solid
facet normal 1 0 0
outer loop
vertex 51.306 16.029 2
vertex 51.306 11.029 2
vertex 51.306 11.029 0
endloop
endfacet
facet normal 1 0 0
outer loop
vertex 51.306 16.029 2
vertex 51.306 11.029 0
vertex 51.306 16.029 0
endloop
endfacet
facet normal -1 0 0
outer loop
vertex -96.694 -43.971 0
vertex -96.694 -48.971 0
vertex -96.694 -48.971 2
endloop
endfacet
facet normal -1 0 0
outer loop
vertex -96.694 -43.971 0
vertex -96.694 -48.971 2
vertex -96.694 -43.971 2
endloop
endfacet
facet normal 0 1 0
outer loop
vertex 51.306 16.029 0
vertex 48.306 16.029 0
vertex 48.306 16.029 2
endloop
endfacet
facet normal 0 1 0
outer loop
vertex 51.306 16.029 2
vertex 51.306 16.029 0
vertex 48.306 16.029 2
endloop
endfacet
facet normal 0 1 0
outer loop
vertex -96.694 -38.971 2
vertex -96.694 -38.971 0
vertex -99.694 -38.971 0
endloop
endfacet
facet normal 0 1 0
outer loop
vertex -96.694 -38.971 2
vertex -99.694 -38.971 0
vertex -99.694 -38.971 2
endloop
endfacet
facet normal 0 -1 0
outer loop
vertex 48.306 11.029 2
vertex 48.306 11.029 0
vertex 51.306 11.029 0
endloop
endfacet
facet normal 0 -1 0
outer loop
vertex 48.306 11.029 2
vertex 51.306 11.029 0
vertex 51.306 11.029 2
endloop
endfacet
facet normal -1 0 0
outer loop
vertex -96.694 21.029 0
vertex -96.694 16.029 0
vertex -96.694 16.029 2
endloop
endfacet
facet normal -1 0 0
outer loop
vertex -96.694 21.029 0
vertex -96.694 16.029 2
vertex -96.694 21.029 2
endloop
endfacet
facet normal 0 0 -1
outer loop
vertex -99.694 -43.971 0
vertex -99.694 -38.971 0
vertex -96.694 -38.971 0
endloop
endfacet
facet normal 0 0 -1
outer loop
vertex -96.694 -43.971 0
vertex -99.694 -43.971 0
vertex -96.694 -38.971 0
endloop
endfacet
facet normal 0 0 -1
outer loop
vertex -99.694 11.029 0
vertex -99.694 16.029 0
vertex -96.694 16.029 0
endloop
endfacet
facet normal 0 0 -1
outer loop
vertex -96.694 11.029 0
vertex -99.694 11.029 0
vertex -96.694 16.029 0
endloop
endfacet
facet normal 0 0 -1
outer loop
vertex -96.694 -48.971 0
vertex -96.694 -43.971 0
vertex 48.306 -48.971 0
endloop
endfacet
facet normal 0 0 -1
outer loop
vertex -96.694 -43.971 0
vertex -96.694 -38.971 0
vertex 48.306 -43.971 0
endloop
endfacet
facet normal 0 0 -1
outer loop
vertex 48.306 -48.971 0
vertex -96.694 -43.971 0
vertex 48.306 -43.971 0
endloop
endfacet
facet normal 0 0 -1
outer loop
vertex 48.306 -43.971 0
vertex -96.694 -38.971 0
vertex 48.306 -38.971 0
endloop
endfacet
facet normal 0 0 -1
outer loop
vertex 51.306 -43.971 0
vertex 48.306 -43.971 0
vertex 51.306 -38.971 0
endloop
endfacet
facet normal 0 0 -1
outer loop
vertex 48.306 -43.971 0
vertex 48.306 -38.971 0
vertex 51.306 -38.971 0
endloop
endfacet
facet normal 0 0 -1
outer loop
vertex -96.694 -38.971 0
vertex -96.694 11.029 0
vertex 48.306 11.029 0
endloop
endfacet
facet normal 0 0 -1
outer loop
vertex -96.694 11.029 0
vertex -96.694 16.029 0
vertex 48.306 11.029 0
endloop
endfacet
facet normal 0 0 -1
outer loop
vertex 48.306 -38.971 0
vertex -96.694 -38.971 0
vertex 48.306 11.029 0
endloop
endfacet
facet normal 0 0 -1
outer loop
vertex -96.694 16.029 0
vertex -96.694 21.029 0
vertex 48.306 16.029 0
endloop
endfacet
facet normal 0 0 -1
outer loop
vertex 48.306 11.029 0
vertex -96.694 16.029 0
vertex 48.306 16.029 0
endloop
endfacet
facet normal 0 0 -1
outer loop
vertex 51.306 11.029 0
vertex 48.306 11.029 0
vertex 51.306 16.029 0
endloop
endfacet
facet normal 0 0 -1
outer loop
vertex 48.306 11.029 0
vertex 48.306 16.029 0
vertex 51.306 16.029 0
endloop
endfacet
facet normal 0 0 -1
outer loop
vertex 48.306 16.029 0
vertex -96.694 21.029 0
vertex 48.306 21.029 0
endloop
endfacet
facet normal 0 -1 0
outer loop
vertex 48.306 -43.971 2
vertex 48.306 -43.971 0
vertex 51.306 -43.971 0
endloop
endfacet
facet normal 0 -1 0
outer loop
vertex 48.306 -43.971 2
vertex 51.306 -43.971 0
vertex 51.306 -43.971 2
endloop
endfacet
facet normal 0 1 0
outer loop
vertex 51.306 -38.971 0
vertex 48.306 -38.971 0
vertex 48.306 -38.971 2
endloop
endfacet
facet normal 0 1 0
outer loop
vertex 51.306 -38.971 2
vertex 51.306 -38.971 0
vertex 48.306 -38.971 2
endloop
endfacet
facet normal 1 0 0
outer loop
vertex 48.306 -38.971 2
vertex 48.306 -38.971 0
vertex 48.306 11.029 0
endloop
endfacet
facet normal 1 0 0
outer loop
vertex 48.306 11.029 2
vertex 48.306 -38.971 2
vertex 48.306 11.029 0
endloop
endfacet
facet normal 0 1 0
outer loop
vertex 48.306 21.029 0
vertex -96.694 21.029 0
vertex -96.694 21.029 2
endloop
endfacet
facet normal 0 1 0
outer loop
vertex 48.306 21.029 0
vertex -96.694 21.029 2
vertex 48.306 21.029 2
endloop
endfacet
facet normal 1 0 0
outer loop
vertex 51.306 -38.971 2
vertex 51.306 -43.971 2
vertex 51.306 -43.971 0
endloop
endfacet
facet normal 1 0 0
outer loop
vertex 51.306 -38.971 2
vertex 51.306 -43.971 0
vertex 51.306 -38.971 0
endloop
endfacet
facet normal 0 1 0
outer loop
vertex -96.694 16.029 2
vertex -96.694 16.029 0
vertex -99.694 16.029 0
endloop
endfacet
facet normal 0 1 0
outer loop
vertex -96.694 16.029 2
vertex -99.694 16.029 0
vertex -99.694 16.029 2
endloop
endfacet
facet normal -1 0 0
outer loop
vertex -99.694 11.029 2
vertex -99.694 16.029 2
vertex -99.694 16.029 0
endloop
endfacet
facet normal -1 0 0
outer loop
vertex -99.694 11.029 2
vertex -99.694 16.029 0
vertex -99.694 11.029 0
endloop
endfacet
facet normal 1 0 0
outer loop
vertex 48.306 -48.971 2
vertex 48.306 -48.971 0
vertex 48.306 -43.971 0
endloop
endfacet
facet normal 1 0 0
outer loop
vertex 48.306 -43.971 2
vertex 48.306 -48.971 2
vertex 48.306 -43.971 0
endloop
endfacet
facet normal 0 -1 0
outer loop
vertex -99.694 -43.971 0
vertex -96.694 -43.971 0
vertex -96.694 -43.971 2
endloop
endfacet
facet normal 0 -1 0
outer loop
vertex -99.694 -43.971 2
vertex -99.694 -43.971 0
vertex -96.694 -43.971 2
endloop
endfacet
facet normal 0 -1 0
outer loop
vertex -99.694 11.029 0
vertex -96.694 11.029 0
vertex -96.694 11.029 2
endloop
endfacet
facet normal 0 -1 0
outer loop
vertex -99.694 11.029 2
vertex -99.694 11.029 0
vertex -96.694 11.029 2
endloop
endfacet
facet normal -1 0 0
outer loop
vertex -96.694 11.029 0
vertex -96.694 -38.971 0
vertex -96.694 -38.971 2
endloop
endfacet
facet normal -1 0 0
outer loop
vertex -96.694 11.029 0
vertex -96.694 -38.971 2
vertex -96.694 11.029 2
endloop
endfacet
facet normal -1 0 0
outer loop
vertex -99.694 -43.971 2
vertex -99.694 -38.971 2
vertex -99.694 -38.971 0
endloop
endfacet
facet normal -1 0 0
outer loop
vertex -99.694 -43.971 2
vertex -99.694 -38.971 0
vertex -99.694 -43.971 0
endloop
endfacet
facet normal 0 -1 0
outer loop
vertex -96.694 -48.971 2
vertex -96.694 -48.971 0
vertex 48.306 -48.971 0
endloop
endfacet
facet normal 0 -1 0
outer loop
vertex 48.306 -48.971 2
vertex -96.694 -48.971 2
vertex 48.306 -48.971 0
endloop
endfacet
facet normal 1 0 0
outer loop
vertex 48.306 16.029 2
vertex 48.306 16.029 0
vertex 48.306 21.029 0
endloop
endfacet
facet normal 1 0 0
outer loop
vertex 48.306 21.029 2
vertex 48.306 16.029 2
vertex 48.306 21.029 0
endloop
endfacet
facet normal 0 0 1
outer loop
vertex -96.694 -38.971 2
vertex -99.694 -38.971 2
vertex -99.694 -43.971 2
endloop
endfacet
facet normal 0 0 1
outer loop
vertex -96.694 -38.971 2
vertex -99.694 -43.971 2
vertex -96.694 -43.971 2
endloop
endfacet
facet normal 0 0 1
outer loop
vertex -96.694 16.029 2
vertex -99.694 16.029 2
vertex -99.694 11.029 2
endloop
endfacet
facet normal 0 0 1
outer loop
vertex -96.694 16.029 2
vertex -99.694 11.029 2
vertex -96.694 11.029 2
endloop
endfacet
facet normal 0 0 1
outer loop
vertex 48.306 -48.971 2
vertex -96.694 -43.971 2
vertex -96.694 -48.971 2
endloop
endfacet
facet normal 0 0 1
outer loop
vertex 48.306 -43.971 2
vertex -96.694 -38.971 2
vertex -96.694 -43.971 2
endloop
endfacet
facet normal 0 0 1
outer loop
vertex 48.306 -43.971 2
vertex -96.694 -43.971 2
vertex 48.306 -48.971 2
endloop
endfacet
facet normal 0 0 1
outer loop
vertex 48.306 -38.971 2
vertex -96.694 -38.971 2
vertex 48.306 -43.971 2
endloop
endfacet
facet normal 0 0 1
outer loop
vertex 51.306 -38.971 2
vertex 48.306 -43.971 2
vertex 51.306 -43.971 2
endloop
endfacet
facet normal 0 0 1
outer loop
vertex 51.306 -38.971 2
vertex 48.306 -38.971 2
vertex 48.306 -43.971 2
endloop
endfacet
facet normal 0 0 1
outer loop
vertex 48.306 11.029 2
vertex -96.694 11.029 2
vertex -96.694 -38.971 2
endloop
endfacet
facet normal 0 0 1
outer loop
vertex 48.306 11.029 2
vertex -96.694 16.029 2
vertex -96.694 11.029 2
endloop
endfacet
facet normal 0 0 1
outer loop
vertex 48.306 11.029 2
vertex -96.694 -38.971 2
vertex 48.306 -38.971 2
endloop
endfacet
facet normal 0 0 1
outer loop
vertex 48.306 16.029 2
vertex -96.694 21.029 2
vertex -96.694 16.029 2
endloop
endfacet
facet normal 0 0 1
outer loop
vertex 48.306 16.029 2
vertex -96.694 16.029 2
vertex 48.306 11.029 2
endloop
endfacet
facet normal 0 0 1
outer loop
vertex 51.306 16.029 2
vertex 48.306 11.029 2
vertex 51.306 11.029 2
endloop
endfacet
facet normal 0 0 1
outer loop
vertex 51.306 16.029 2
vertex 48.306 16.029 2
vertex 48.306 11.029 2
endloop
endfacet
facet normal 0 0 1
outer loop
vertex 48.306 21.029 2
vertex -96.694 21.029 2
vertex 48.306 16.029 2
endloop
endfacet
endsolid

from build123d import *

# Parameters (mm, degrees)
F0_W     = 145
F0_H     = 70
F1_DEPTH = 2
F2_W     = 5
F2_H     = 2
F3_DEPTH = 3
F4_W     = 5
F4_H     = 2
F5_DEPTH = 3


with BuildPart() as f1:
    # F0 (on Top) → F1 (new body)
    with BuildSketch(Plane.XY):
        with Locations((-24.19392, -13.970558)):
            Rectangle(F0_W, F0_H)
    extrude(amount=F1_DEPTH)

    # F2 (on face) → F3 (join)
    with BuildSketch(Plane(origin=(-96.69392, 0, 0), x_dir=(0, -1, 0), z_dir=(-1, 0, 0))):
        with Locations((-13.529442, 1)):
            Rectangle(F2_W, F2_H)
        with Locations((41.470558, 1)):
            Rectangle(F2_W, F2_H)
    extrude(amount=F3_DEPTH)

    # F4 (on face) → F5 (join)
    with BuildSketch(Plane.YZ.offset(48.30608)):
        with Locations((13.529442, 1)):
            Rectangle(F4_W, F4_H)
        with Locations((-41.470558, 1)):
            Rectangle(F4_W, F4_H)
    extrude(amount=F5_DEPTH)


solid = f1.part
